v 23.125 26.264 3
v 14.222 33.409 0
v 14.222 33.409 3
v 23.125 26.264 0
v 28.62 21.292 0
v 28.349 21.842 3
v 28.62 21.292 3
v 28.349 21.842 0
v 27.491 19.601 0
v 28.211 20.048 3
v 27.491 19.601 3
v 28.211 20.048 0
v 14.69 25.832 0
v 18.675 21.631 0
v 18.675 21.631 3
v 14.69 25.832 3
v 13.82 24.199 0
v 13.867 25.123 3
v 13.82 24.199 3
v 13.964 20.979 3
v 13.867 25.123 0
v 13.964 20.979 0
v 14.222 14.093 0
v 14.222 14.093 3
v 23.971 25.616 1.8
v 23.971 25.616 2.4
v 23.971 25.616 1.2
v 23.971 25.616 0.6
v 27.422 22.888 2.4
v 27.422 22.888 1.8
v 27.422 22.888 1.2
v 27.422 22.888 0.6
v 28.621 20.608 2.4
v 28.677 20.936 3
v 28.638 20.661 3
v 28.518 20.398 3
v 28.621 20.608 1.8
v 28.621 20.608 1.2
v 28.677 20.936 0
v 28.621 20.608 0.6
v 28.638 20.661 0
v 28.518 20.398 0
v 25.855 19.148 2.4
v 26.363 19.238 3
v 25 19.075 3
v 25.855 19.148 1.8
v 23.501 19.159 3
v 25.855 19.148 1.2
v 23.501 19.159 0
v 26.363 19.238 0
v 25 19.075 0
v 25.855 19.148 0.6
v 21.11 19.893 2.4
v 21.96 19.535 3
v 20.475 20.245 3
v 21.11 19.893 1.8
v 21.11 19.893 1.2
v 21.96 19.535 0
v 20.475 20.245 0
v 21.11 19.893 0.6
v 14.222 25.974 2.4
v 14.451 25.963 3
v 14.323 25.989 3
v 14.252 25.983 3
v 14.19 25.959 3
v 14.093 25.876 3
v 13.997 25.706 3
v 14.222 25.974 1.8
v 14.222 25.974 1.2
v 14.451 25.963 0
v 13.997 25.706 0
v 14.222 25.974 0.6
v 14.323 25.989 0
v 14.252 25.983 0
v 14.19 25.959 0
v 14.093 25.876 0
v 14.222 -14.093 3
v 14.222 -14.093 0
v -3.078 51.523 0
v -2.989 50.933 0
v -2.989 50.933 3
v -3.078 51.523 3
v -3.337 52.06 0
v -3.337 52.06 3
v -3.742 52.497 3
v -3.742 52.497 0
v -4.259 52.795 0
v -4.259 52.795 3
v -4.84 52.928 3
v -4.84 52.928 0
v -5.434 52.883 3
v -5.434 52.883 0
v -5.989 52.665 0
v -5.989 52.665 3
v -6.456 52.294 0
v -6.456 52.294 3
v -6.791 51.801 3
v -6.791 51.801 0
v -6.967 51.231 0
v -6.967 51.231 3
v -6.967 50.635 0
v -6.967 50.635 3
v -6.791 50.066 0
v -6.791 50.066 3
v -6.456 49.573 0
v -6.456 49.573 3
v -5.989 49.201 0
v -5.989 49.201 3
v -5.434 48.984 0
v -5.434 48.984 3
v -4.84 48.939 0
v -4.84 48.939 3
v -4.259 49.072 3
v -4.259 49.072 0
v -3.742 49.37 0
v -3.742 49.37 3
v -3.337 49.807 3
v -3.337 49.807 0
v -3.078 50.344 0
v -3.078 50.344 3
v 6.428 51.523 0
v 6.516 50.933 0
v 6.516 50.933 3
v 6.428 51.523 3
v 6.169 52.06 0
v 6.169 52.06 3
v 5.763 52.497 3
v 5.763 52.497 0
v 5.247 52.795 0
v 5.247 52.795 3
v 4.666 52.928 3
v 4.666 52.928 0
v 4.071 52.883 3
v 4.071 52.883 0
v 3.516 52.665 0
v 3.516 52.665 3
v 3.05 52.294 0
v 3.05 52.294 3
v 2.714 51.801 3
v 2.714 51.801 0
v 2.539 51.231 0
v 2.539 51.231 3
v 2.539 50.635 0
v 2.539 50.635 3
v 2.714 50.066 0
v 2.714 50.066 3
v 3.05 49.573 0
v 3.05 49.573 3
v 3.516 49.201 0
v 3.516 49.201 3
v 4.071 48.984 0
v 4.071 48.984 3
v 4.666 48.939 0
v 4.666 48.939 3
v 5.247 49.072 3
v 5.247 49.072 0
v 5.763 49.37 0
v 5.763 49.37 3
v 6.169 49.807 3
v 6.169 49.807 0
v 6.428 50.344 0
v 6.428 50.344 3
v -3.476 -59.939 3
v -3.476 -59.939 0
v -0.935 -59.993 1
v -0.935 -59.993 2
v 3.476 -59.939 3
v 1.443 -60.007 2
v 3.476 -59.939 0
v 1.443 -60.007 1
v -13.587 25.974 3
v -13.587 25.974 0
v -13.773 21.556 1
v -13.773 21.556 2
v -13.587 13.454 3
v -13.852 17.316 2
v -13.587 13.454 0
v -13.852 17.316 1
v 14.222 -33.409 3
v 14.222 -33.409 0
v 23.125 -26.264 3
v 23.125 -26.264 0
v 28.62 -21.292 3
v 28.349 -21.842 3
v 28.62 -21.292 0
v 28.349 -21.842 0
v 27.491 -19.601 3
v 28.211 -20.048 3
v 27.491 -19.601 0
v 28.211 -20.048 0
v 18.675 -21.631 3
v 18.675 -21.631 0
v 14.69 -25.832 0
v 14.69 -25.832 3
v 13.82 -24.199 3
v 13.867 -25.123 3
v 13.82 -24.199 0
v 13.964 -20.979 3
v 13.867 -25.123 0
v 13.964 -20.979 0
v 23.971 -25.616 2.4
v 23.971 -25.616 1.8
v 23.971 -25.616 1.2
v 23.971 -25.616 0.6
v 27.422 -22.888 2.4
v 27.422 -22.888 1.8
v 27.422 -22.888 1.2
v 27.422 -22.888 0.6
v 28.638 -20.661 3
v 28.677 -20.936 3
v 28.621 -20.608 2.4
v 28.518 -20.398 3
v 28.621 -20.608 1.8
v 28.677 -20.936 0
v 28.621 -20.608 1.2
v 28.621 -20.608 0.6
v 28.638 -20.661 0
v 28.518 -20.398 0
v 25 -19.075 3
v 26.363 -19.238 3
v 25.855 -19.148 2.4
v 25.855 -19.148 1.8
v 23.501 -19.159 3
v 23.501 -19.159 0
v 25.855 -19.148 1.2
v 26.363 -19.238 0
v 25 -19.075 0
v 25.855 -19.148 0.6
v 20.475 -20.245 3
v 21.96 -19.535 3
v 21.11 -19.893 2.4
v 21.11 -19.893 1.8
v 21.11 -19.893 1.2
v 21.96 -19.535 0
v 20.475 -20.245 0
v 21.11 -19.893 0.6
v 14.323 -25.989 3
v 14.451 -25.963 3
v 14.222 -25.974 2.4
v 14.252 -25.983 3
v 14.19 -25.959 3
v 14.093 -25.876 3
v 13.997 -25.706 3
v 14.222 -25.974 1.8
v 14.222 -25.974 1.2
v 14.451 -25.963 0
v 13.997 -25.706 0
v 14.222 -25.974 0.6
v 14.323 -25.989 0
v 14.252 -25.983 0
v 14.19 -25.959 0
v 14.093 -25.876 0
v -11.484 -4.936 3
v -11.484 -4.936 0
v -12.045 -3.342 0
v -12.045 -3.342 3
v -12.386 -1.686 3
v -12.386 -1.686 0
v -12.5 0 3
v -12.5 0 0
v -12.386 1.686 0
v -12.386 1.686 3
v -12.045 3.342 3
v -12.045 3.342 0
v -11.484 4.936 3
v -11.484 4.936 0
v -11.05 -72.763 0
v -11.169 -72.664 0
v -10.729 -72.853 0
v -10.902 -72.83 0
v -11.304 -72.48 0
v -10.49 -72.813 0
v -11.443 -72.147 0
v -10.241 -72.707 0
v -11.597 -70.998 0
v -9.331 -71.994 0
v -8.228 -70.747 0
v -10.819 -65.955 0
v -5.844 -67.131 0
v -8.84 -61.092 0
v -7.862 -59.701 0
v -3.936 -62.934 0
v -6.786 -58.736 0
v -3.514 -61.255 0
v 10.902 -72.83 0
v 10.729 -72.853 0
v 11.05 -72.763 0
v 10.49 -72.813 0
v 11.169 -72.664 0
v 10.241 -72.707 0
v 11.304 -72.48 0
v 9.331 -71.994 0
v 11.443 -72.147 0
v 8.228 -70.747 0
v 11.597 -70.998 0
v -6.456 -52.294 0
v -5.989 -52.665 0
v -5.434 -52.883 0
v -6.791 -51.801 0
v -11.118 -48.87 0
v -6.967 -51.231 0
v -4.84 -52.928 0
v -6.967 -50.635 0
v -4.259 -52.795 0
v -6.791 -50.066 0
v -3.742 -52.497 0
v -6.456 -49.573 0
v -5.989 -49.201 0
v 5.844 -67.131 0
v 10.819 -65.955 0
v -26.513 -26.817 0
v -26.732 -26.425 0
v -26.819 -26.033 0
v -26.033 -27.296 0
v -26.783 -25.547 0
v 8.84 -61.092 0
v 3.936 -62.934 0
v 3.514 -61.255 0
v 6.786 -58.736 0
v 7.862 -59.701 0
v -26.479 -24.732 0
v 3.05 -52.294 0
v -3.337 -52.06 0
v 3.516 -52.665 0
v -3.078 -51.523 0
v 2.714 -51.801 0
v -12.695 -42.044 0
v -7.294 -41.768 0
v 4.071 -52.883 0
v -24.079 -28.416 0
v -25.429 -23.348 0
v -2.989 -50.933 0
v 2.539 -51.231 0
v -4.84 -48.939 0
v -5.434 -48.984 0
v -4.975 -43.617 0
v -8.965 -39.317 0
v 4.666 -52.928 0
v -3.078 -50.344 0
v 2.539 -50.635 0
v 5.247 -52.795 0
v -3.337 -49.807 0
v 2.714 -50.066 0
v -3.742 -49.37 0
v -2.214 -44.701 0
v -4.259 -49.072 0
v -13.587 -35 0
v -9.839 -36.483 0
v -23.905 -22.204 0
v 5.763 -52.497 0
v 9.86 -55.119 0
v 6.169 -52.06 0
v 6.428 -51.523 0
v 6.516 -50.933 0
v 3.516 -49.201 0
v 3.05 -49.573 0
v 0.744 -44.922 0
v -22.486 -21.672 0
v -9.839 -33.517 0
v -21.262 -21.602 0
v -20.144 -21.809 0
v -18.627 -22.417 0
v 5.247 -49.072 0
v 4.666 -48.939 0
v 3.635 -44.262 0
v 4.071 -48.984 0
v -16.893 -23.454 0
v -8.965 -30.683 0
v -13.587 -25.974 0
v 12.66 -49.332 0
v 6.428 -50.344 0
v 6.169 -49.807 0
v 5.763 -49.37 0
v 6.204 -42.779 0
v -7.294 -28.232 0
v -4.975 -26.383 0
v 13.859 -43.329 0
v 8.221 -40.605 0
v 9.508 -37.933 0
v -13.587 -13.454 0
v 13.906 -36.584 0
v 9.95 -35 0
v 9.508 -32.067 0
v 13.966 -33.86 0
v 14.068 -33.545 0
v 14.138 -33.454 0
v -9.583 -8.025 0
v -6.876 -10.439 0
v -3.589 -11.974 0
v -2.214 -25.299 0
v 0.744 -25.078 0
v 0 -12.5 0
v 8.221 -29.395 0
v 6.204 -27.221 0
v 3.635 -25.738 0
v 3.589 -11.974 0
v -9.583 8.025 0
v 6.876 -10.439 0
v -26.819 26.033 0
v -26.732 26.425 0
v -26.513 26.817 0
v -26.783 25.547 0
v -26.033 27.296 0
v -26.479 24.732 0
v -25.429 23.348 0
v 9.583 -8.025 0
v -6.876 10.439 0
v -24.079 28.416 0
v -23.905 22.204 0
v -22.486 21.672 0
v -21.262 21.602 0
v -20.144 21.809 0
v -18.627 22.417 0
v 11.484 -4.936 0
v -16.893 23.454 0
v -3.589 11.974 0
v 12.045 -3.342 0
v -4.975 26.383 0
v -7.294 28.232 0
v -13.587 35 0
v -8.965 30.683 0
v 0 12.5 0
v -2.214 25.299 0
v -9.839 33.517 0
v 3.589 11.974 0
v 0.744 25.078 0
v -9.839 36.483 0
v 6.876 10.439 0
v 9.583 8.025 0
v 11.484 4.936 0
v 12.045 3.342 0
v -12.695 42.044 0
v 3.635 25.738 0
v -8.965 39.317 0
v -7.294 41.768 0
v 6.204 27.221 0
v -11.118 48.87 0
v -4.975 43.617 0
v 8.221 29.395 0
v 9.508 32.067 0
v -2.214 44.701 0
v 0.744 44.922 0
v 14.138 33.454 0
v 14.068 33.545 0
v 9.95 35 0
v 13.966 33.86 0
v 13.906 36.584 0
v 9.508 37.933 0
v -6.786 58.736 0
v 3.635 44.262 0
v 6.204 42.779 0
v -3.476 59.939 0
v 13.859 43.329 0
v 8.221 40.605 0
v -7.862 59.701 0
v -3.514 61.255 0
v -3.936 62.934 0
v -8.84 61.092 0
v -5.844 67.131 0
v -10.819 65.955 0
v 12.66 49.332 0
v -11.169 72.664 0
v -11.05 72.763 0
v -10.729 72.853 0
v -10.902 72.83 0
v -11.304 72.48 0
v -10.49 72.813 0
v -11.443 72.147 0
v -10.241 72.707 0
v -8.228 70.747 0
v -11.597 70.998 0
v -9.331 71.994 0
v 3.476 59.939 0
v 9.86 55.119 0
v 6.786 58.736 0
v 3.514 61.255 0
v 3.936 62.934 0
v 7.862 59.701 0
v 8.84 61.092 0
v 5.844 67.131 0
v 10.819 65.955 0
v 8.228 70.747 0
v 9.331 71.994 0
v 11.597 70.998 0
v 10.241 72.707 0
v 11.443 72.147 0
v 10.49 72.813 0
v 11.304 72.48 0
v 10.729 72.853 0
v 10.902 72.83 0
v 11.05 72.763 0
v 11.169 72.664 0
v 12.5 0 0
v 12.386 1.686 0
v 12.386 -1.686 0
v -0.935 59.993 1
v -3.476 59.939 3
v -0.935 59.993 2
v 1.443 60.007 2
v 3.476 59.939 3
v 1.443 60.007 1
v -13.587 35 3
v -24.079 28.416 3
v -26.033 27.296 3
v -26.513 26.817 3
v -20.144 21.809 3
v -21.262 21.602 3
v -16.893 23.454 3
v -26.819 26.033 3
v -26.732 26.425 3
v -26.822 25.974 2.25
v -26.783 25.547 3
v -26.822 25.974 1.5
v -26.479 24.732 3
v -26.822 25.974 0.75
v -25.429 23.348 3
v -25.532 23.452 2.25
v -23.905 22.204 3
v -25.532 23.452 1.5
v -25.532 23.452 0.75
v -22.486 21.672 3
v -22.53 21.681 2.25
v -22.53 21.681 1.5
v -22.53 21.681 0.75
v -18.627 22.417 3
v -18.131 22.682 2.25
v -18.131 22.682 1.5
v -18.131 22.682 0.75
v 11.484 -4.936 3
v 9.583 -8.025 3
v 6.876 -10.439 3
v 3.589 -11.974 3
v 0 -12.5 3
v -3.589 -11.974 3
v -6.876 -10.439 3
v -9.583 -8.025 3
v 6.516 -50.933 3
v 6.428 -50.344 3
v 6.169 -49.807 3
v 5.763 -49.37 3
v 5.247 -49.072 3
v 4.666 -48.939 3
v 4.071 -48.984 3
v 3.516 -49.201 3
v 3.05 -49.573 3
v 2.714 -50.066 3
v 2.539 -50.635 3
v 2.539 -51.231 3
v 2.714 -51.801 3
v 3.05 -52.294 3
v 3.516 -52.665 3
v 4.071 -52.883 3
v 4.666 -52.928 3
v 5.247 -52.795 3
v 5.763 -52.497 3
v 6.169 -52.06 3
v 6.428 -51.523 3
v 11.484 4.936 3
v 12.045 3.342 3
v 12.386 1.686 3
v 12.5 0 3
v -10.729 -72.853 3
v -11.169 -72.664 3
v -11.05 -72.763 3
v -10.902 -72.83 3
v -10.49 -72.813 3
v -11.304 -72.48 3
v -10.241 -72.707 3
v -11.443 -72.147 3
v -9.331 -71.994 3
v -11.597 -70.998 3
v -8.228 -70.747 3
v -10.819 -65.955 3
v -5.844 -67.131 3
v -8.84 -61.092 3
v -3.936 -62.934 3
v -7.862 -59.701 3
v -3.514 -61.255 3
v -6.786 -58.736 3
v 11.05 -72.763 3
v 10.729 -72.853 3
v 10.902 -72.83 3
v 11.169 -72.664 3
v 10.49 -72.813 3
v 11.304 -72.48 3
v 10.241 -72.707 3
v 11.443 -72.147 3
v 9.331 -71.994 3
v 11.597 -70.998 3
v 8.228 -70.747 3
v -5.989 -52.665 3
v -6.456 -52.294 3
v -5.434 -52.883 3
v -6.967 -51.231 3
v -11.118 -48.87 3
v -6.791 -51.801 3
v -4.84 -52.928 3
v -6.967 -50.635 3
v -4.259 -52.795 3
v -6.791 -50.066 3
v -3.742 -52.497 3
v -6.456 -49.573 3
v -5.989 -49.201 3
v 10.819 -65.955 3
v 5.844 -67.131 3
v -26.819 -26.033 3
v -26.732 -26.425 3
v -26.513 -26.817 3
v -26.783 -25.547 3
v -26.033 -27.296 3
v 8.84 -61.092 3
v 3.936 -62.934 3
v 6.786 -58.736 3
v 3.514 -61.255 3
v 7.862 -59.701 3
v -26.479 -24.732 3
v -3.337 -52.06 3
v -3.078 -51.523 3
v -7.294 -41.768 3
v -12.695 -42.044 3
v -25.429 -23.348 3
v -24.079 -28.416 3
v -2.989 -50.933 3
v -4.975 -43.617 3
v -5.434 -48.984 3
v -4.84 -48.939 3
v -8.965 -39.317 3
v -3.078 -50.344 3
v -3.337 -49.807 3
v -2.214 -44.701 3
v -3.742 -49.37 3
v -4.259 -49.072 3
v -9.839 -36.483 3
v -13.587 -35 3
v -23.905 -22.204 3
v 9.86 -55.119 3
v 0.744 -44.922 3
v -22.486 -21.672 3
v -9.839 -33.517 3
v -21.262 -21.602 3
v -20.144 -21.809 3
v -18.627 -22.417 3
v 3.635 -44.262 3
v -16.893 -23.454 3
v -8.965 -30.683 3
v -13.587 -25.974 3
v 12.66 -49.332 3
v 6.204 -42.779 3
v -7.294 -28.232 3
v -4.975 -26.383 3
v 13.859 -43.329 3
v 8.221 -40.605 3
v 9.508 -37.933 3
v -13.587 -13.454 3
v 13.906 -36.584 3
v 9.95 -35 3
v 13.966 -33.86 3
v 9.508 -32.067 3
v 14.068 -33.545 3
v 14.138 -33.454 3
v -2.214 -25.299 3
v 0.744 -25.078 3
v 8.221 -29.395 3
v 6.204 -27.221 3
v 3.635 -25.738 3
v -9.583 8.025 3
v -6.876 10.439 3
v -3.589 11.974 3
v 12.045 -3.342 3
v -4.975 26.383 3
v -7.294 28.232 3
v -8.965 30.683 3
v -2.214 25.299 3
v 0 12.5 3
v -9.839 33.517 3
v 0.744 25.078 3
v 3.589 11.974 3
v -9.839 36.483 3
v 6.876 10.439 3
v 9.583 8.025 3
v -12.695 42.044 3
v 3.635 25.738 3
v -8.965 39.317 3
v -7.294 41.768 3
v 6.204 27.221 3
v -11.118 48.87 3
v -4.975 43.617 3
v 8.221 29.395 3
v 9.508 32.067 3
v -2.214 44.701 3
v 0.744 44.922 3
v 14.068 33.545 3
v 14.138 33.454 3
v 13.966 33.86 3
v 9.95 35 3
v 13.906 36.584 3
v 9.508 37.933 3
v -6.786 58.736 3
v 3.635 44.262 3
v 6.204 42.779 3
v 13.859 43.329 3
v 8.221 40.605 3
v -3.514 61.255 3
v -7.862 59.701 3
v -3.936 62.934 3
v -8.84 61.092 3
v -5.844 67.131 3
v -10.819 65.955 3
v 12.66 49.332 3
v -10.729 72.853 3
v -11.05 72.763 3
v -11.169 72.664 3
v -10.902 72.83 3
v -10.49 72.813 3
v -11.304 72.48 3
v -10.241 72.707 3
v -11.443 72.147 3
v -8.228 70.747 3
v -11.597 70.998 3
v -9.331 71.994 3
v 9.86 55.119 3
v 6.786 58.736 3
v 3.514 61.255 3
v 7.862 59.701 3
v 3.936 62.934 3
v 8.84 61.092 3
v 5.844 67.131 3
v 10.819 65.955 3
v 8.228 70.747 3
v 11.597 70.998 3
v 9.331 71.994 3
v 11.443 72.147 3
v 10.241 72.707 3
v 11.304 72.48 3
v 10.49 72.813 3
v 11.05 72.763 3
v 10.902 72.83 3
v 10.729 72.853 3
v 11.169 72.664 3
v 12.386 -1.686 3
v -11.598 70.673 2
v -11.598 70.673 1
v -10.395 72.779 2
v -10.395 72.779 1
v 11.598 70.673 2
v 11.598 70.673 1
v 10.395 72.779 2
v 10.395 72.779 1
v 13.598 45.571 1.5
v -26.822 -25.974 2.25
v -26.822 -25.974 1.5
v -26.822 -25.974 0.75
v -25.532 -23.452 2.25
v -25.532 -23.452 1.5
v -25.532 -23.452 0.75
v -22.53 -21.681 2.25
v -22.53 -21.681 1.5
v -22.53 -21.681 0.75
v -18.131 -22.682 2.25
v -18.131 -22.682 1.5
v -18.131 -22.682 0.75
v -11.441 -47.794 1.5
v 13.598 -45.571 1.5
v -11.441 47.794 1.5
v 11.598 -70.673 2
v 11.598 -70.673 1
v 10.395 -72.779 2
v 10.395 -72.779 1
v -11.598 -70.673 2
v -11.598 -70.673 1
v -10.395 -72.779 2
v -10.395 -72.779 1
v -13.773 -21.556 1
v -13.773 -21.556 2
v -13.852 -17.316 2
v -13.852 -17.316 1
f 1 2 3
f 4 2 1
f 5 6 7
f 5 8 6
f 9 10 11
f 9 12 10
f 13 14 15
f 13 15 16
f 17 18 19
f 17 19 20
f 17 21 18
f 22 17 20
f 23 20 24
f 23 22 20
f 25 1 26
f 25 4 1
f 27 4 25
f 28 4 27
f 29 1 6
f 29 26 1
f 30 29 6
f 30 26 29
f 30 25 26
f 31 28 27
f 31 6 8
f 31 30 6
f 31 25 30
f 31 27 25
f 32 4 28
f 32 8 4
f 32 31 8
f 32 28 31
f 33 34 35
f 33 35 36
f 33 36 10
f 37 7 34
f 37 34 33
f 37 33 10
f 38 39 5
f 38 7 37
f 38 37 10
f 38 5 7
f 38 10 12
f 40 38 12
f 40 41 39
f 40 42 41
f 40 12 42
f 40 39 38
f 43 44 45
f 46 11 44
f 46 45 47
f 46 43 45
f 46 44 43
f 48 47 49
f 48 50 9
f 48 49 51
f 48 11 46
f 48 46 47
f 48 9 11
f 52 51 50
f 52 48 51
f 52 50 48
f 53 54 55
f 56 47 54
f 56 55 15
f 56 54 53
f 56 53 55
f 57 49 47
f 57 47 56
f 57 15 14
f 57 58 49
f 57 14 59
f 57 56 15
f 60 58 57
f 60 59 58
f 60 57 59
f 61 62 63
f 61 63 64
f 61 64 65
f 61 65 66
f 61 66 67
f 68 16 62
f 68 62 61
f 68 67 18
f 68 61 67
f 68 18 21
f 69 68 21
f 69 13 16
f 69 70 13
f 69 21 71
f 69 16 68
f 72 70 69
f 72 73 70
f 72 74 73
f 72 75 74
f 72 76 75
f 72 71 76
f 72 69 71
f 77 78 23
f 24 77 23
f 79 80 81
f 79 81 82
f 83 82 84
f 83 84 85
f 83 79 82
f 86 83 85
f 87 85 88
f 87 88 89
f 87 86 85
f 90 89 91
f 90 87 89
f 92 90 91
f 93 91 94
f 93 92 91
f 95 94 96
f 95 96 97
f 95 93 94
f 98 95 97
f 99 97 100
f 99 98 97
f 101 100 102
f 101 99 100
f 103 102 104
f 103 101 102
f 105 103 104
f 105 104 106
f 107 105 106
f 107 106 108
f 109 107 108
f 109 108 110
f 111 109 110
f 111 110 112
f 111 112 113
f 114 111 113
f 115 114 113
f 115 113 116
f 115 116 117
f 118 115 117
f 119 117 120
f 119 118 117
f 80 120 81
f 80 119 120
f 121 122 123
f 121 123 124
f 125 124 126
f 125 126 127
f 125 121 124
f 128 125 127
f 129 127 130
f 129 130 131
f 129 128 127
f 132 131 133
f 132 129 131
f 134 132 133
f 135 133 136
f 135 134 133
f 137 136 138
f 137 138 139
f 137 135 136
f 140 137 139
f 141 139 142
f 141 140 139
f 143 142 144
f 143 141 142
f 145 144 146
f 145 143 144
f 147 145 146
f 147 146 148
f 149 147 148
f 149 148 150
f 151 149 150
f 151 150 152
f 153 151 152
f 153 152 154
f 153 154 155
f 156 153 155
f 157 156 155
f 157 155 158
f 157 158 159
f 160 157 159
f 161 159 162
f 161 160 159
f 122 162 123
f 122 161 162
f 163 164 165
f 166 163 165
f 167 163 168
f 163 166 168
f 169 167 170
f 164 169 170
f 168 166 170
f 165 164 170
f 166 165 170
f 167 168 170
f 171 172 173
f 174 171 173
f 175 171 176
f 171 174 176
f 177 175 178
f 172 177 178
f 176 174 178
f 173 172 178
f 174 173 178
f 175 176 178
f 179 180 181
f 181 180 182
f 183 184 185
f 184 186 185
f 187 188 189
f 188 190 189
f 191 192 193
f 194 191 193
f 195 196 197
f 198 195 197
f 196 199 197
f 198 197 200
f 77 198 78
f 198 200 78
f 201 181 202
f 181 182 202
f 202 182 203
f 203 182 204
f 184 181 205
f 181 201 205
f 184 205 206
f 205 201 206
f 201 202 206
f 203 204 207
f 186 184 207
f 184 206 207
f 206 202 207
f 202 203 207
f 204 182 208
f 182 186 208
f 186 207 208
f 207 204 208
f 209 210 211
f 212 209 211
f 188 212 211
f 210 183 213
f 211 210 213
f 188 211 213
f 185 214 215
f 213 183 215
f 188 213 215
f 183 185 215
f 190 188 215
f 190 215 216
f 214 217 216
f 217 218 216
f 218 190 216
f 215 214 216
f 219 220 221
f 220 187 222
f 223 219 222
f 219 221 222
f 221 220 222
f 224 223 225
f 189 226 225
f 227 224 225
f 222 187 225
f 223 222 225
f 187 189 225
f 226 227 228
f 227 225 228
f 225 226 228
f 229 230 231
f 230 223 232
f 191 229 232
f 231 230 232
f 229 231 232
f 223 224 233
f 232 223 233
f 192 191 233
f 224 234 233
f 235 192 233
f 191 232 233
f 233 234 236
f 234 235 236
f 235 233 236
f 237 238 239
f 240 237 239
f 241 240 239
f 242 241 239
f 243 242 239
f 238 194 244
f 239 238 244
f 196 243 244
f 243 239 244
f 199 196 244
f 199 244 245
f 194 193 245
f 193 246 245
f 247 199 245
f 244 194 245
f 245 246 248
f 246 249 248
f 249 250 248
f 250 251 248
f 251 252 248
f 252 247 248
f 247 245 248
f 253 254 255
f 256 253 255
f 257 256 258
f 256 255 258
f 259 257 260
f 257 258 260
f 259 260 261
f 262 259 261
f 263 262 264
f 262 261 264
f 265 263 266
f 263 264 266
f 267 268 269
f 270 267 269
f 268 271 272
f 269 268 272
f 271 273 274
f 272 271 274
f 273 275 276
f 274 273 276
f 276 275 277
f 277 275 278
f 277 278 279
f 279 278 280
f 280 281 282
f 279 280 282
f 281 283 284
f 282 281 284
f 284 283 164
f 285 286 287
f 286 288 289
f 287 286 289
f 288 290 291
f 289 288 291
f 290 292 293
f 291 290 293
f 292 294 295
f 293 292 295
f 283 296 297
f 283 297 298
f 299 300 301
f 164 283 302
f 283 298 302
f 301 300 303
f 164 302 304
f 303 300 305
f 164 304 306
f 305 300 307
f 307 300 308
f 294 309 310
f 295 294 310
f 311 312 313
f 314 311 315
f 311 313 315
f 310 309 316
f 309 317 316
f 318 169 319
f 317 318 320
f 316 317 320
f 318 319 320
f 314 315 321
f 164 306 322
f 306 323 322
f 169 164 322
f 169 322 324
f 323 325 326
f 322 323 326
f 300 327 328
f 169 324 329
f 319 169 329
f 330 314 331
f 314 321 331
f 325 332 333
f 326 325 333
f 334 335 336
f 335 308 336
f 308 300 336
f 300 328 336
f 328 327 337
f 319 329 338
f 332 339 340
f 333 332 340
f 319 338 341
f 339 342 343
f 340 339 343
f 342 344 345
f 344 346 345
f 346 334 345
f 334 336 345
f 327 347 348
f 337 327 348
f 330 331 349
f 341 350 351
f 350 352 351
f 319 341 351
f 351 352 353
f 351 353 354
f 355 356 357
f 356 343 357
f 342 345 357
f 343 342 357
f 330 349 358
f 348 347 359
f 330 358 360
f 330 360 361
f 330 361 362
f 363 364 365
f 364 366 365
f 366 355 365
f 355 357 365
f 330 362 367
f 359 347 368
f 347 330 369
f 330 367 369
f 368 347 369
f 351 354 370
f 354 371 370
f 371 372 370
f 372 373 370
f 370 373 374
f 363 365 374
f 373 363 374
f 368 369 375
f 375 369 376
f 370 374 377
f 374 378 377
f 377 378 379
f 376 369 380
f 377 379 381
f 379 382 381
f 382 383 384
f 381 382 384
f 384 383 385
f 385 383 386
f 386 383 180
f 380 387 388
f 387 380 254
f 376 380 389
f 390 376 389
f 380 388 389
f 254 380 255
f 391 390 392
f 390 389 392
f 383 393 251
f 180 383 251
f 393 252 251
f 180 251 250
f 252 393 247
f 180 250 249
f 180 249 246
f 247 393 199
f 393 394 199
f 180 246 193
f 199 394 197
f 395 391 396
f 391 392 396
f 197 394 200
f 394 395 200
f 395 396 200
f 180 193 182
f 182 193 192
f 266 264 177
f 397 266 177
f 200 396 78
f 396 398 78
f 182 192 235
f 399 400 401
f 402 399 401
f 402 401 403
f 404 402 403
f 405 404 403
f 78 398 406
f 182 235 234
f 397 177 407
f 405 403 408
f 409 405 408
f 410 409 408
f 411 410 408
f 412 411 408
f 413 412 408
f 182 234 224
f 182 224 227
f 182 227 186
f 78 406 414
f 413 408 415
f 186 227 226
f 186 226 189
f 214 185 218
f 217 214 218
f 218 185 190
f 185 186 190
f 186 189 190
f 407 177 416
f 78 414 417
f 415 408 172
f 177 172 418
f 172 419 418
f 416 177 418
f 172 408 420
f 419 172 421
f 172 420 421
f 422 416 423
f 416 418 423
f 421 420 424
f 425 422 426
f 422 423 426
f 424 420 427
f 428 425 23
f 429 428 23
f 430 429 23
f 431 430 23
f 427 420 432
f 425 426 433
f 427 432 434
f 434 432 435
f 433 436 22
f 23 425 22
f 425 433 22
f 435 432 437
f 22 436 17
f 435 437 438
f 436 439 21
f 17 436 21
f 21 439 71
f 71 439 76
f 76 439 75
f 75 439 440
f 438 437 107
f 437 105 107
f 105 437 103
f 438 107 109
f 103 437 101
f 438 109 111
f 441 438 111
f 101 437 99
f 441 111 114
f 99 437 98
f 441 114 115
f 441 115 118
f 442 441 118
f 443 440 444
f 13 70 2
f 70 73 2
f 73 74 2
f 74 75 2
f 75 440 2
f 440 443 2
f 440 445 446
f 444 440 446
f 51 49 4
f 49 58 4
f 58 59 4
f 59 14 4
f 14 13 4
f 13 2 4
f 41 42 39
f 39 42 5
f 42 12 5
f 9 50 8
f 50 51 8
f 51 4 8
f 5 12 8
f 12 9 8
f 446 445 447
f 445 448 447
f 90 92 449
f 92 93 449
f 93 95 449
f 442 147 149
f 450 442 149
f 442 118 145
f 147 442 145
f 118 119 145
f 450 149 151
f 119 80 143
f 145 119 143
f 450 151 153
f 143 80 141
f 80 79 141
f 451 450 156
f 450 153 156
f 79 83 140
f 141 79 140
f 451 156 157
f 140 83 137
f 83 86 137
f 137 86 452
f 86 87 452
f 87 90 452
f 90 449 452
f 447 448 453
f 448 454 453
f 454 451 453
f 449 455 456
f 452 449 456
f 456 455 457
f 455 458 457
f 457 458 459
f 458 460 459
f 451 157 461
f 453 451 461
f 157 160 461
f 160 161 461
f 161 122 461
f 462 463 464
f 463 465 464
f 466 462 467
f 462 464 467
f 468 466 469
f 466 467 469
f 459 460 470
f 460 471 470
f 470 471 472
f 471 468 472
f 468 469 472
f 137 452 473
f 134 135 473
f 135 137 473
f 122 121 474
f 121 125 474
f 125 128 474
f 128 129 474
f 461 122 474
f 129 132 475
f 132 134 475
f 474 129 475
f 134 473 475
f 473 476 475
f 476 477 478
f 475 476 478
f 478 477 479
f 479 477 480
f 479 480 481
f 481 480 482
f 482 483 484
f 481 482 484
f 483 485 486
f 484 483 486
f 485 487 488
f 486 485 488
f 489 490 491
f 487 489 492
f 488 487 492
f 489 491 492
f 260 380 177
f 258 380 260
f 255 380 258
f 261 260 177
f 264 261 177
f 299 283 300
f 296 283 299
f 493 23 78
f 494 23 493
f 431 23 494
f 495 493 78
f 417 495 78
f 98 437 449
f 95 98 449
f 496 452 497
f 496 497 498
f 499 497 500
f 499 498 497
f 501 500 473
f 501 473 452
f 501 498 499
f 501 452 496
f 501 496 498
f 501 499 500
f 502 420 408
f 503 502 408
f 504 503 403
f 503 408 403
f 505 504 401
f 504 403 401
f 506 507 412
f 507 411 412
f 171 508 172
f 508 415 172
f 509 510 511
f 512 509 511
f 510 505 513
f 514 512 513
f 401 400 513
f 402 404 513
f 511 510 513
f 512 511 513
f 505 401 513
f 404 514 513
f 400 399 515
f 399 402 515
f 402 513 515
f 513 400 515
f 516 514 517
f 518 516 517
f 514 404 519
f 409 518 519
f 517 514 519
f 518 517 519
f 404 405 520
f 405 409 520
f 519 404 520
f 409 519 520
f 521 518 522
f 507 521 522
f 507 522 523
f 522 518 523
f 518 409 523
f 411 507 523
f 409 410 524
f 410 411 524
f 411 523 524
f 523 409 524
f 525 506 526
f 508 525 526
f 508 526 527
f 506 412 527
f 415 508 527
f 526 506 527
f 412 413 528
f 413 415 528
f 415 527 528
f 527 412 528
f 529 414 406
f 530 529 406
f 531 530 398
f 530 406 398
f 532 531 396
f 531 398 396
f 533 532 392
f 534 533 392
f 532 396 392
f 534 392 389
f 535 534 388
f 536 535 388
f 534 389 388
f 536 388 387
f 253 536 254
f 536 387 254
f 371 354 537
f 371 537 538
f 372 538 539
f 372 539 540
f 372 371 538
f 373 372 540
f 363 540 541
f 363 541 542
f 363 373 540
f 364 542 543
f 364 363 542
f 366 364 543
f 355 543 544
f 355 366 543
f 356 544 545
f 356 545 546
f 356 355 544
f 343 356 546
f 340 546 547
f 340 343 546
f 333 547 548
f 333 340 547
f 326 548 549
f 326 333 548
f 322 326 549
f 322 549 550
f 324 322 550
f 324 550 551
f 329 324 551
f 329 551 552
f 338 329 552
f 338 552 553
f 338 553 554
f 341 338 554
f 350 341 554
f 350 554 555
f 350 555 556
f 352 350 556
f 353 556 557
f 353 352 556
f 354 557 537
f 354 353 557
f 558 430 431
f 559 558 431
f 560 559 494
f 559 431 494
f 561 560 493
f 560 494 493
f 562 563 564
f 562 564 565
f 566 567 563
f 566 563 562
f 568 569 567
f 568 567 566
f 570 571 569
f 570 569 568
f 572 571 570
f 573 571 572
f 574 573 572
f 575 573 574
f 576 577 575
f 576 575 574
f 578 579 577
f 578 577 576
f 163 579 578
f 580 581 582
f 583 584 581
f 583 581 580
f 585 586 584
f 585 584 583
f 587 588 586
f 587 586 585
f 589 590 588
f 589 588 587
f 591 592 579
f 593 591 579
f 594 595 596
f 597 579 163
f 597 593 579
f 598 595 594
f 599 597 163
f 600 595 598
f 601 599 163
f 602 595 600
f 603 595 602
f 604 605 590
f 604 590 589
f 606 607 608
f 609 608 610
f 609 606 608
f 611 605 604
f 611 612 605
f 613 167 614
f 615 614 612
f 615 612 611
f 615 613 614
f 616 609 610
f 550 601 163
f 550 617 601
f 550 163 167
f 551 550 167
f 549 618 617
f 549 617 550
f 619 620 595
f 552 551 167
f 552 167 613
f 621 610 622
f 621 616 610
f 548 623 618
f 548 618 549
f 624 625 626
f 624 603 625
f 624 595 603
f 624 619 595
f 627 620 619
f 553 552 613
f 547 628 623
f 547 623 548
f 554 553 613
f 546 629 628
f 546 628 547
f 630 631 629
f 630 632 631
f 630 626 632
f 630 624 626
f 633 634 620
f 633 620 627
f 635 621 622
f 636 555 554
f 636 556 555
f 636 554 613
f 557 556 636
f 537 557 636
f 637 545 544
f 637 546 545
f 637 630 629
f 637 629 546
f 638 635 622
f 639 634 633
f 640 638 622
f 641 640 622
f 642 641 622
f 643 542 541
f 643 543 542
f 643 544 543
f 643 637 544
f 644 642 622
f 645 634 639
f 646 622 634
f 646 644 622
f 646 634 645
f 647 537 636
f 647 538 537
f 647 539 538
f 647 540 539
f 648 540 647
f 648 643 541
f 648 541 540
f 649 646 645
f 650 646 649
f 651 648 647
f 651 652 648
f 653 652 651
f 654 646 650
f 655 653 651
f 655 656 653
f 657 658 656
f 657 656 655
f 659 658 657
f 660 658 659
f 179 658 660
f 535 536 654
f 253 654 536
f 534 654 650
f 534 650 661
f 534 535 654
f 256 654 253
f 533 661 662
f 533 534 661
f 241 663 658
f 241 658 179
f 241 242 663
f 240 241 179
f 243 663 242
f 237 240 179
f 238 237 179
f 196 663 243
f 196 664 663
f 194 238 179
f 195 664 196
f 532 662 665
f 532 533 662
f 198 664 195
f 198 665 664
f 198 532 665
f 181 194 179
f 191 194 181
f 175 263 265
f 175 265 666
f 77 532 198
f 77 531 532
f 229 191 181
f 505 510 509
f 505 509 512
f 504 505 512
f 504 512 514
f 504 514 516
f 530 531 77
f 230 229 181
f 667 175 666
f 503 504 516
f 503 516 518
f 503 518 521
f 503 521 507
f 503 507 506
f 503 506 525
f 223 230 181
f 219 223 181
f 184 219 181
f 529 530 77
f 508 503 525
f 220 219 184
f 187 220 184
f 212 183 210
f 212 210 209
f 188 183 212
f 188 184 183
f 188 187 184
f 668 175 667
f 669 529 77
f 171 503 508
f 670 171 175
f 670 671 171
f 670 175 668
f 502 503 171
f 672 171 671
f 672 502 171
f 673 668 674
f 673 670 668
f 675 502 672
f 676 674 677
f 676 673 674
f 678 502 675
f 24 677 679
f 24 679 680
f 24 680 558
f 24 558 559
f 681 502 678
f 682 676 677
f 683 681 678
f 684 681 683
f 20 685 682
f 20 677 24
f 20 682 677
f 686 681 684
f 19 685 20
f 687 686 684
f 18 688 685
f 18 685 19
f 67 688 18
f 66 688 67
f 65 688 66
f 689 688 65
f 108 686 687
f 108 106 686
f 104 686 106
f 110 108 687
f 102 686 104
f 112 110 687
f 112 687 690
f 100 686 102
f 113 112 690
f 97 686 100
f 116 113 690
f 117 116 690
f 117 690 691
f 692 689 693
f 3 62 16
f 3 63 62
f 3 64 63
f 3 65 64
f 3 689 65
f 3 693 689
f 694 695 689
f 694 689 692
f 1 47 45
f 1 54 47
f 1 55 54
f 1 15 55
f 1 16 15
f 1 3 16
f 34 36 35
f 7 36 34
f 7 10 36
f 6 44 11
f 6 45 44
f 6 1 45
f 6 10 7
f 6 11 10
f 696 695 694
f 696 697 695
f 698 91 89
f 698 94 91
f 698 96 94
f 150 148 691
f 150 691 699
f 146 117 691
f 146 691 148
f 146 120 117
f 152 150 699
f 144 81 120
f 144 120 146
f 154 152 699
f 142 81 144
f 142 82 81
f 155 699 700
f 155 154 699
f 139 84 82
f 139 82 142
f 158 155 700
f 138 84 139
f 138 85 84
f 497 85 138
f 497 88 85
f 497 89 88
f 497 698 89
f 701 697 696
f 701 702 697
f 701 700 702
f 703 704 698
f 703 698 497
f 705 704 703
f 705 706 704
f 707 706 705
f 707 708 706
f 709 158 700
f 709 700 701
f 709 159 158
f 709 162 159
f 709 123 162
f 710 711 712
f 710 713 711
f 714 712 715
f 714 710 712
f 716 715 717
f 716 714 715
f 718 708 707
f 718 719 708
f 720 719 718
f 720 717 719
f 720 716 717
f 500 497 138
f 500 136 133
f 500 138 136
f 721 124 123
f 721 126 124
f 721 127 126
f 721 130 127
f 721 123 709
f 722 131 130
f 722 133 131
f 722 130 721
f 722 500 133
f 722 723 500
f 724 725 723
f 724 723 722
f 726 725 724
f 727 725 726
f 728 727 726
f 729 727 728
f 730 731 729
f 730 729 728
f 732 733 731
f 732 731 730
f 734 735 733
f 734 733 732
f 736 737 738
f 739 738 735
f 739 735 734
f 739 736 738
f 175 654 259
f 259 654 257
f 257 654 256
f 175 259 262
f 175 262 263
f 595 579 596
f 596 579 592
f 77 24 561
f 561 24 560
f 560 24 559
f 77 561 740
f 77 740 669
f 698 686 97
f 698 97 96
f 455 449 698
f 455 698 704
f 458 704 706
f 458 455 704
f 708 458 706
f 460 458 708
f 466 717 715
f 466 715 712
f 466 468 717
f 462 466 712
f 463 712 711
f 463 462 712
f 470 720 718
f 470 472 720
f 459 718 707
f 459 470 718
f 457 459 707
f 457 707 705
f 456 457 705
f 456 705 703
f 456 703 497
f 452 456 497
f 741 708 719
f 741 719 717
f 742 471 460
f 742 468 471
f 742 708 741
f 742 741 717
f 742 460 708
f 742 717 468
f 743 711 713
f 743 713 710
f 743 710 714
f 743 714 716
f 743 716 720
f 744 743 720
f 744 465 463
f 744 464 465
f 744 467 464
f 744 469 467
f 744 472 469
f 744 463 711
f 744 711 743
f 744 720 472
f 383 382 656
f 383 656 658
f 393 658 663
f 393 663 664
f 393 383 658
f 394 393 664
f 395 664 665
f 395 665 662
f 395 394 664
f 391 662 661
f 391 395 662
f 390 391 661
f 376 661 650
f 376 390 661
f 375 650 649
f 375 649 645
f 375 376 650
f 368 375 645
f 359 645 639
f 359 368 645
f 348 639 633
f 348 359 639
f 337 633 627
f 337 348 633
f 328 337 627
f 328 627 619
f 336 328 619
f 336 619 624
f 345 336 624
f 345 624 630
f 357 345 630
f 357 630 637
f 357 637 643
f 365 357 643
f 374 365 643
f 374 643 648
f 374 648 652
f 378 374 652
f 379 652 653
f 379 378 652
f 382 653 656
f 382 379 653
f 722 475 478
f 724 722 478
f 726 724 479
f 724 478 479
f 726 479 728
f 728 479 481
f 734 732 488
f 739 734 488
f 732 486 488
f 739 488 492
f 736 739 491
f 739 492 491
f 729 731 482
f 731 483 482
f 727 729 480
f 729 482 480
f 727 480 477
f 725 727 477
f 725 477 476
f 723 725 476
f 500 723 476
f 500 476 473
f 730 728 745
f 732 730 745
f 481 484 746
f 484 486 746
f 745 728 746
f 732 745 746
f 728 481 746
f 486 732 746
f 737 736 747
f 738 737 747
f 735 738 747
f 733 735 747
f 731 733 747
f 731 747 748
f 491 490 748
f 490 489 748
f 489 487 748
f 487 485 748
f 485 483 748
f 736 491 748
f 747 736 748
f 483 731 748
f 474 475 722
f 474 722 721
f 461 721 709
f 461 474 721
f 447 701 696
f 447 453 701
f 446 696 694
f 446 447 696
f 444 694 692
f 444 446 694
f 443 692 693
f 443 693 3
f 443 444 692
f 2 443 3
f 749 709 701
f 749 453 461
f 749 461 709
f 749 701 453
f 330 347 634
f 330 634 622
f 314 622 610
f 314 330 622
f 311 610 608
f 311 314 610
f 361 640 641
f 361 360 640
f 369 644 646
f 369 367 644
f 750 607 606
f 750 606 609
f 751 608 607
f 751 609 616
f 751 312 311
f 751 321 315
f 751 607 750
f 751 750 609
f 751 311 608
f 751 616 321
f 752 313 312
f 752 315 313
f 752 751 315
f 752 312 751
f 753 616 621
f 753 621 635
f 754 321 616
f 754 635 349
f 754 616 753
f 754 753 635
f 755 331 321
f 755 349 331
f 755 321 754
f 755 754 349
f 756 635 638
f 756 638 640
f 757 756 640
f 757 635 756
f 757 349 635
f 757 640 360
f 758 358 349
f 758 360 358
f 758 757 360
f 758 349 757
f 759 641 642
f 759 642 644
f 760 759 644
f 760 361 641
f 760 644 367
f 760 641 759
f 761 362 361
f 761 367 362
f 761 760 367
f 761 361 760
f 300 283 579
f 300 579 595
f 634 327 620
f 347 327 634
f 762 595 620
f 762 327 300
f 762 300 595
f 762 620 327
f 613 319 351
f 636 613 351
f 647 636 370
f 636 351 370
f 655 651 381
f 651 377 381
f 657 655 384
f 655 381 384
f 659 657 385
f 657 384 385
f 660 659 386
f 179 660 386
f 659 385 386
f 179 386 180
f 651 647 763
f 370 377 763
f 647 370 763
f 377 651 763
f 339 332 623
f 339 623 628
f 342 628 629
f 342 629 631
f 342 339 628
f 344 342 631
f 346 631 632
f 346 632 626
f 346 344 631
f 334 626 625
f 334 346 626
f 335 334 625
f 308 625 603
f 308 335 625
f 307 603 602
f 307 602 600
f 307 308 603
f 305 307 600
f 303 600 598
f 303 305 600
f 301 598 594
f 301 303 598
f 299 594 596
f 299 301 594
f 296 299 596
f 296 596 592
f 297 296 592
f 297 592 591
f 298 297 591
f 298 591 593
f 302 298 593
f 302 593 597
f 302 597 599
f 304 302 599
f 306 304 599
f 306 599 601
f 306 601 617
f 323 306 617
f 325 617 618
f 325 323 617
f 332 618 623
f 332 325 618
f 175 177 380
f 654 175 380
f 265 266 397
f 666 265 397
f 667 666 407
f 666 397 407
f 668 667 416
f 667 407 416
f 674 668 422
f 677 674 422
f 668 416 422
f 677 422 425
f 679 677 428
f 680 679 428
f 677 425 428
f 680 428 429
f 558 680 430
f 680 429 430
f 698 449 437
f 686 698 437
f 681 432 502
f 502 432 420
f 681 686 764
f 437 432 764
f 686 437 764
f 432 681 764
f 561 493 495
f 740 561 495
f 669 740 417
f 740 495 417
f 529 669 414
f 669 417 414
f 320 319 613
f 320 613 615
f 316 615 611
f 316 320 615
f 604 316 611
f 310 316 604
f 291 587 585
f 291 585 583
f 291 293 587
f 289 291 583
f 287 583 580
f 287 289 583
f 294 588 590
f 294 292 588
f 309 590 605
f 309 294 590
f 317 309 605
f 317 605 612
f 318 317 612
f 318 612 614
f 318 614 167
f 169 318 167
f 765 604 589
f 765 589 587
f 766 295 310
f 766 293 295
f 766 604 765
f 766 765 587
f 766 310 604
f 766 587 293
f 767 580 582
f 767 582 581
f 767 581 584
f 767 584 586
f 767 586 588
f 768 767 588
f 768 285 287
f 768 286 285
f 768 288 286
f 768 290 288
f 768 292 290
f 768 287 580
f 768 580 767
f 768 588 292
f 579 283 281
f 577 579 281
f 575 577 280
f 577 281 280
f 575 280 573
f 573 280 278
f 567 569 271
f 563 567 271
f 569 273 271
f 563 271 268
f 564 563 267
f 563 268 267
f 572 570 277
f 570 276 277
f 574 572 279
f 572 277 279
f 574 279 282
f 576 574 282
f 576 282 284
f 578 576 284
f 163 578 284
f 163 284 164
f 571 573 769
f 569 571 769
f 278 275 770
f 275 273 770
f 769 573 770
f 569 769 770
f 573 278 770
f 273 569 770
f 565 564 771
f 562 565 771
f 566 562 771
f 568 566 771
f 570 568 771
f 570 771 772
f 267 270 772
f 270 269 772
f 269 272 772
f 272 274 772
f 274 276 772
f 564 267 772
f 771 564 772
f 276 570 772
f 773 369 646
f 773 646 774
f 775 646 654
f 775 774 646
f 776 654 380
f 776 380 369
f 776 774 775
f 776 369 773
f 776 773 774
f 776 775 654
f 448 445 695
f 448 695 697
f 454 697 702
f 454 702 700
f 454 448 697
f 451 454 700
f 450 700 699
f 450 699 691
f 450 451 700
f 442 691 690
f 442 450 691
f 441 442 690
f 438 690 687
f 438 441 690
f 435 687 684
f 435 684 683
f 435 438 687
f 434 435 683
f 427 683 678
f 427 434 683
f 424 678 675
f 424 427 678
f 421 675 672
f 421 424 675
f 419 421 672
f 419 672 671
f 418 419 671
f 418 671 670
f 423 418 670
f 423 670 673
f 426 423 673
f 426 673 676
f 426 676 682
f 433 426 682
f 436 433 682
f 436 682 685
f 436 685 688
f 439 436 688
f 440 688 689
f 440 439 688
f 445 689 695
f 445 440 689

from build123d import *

# Parameters (mm, degrees)
F0_R     = 9.95
F0_R_2   = 2
F1_DEPTH = 3


with BuildPart() as f1:
    # F0 (on Top) → F1 (new body)
    with BuildSketch(Plane.XY):
        with BuildLine():
            ThreePointArc((11.4841992525, 4.9359059482), (12.2434164075, 2.5196735249), (12.5, 0))
            ThreePointArc((12.5, 0), (12.2434164075, -2.5196735249), (11.4841992525, -4.9359059482))
            add(Edge.make_bspline(
                [(14.2224282026, -14.0928809608), (14.0544920655, -9.8907769593), (12.786453361, -7.4166448155), (11.4841992525, -4.9359059482)],
                knots=[0.8325588202, 0.8325588202, 0.8325588202, 0.8325588202, 1, 1, 1, 1], degree=3))
            Line((14.2224282026, -14.0928809608), (14.2224282026, 14.0928809608))
            add(Edge.make_bspline(
                [(14.2224282026, 14.0928809608), (14.0544920655, 9.8907769593), (12.786453361, 7.4166448155), (11.4841992525, 4.9359059482)],
                knots=[0.8325588202, 0.8325588202, 0.8325588202, 0.8325588202, 1, 1, 1, 1], degree=3))
        make_face()
        with BuildLine():
            ThreePointArc((-11.4841992525, 4.9359059482), (0, 12.5), (11.4841992525, 4.9359059482))
            add(Edge.make_bspline(
                [(14.2224282026, 14.0928809608), (14.0544920655, 9.8907769593), (12.786453361, 7.4166448155), (11.4841992525, 4.9359059482)],
                knots=[0.8325588202, 0.8325588202, 0.8325588202, 0.8325588202, 1, 1, 1, 1], degree=3))
            add(Edge.make_bspline(
                [(14.2224282026, 33.4090046103), (17.2490888751, 31.053920445), (22.9972849489, 26.096831604), (31.8177344645, 20.0637888806), (19.9640756328, 17.3628075785), (12.1914727142, 31.6199203566), (14.4096662851, 18.7779589277), (14.2224282026, 14.0928809608)],
                knots=[0, 0, 0, 0, 0.1913410371, 0.3329271624, 0.4817047499, 0.6458725835, 0.8325588202, 0.8325588202, 0.8325588202, 0.8325588202], degree=3))
            add(Edge.make_bspline(
                [(6.7855482785, 58.7356220744), (9.1373873892, 56.8141843385), (15.7434191997, 47.0784545997), (13.3729768574, 33.6002030956), (14.2224282026, 33.4090046103)],
                knots=[0.3534018687, 0.3534018687, 0.3534018687, 0.3534018687, 0.6548758459, 0.9281252581, 0.9281252581, 0.9281252581, 0.9281252581], degree=3))
            add(Edge.make_bspline(
                [(3.4762175574, 59.9388580104), (3.7176838971, 58.2597836406), (5.3504042624, 57.8229914395), (6.7855482785, 58.7356220744)],
                knots=[0.8268984236, 0.8268984236, 0.8268984236, 0.8268984236, 1, 1, 1, 1], degree=3))
            add(Edge.make_bspline(
                [(-3.4762175574, 59.9388580104), (-0.9132762133, 60), (1.6758513881, 60.0610536656), (3.4762175574, 59.9388580104)],
                knots=[0, 0, 0, 0, 0.2064654422, 0.2064654422, 0.2064654422, 0.2064654422], degree=3))
            add(Edge.make_bspline(
                [(-3.4762175574, 59.9388580104), (-3.7176838971, 58.2597836406), (-5.3504042624, 57.8229914395), (-6.7855482785, 58.7356220744)],
                knots=[0.8268984236, 0.8268984236, 0.8268984236, 0.8268984236, 1, 1, 1, 1], degree=3))
            add(Edge.make_bspline(
                [(-6.7855482785, 58.7356220744), (-8.5881051608, 55.5003900744), (-12.1208026299, 47.809859872), (-13.1336634583, 39.352034704), (-13.5873220861, 35)],
                knots=[0, 0, 0, 0, 0.4891254011, 1, 1, 1, 1], degree=3))
            add(Edge.make_bspline(
                [(-13.5873220861, 35), (-16.9512808708, 32.6719958826), (-22.4422707428, 28.8719947978), (-28.7100144619, 26.5342926433), (-22.0598012934, 19.1597220145), (-16.6324705303, 23.5247038367), (-13.5873220861, 25.9737931192)],
                knots=[0, 0, 0, 0, 0.3038929296, 0.4960444243, 0.7172423049, 1, 1, 1, 1], degree=3))
            add(Edge.make_bspline(
                [(-13.5873220861, 25.9737931192), (-13.7484282726, 21.5353356165), (-14.1021202558, 17.0585195355), (-13.5873220861, 13.4542575106)],
                knots=[0, 0, 0, 0, 0.544318651, 0.544318651, 0.544318651, 0.544318651], degree=3))
            add(Edge.make_bspline(
                [(-13.5873220861, 13.4542575106), (-13.1563540785, 10.436916512), (-12.116717364, 8.0310923479), (-11.4841992525, 4.9359059482)],
                knots=[0.544318651, 0.544318651, 0.544318651, 0.544318651, 1, 1, 1, 1], degree=3))
        make_face()
        with Locations((0, 35)):
            Circle(F0_R, mode=Mode.SUBTRACT)
        with Locations((-4.9894000404, 50.9333796799)):
            Circle(F0_R_2, mode=Mode.SUBTRACT)
        with Locations((4.5164329931, 50.9333796799)):
            Circle(F0_R_2, mode=Mode.SUBTRACT)
        with BuildLine():
            add(Edge.make_bspline(
                [(14.2224282026, -14.0928809608), (14.0544920655, -9.8907769593), (12.786453361, -7.4166448155), (11.4841992525, -4.9359059482)],
                knots=[0.8325588202, 0.8325588202, 0.8325588202, 0.8325588202, 1, 1, 1, 1], degree=3))
            ThreePointArc((11.4841992525, -4.9359059482), (0, -12.5), (-11.4841992525, -4.9359059482))
            add(Edge.make_bspline(
                [(-13.5873220861, -13.4542575106), (-13.1563540785, -10.436916512), (-12.116717364, -8.0310923479), (-11.4841992525, -4.9359059482)],
                knots=[0.544318651, 0.544318651, 0.544318651, 0.544318651, 1, 1, 1, 1], degree=3))
            add(Edge.make_bspline(
                [(-13.5873220861, -25.9737931192), (-13.7484282726, -21.5353356165), (-14.1021202558, -17.0585195355), (-13.5873220861, -13.4542575106)],
                knots=[0, 0, 0, 0, 0.544318651, 0.544318651, 0.544318651, 0.544318651], degree=3))
            add(Edge.make_bspline(
                [(-13.5873220861, -35), (-16.9512808708, -32.6719958826), (-22.4422707428, -28.8719947978), (-28.7100144619, -26.5342926433), (-22.0598012934, -19.1597220145), (-16.6324705303, -23.5247038367), (-13.5873220861, -25.9737931192)],
                knots=[0, 0, 0, 0, 0.3038929296, 0.4960444243, 0.7172423049, 1, 1, 1, 1], degree=3))
            add(Edge.make_bspline(
                [(-6.7855482785, -58.7356220744), (-8.5881051608, -55.5003900744), (-12.1208026299, -47.809859872), (-13.1336634583, -39.352034704), (-13.5873220861, -35)],
                knots=[0, 0, 0, 0, 0.4891254011, 1, 1, 1, 1], degree=3))
            add(Edge.make_bspline(
                [(-3.4762175574, -59.9388580104), (-3.7176838971, -58.2597836406), (-5.3504042624, -57.8229914395), (-6.7855482785, -58.7356220744)],
                knots=[0.8268984236, 0.8268984236, 0.8268984236, 0.8268984236, 1, 1, 1, 1], degree=3))
            add(Edge.make_bspline(
                [(-3.4762175574, -59.9388580104), (-0.9132762133, -60), (1.6758513881, -60.0610536656), (3.4762175574, -59.9388580104)],
                knots=[0, 0, 0, 0, 0.2064654422, 0.2064654422, 0.2064654422, 0.2064654422], degree=3))
            add(Edge.make_bspline(
                [(3.4762175574, -59.9388580104), (3.7176838971, -58.2597836406), (5.3504042624, -57.8229914395), (6.7855482785, -58.7356220744)],
                knots=[0.8268984236, 0.8268984236, 0.8268984236, 0.8268984236, 1, 1, 1, 1], degree=3))
            add(Edge.make_bspline(
                [(6.7855482785, -58.7356220744), (9.1373873892, -56.8141843385), (15.7434191997, -47.0784545997), (13.3729768574, -33.6002030956), (14.2224282026, -33.4090046103)],
                knots=[0.3534018687, 0.3534018687, 0.3534018687, 0.3534018687, 0.6548758459, 0.9281252581, 0.9281252581, 0.9281252581, 0.9281252581], degree=3))
            add(Edge.make_bspline(
                [(14.2224282026, -33.4090046103), (17.2490888751, -31.053920445), (22.9972849489, -26.096831604), (31.8177344645, -20.0637888806), (19.9640756328, -17.3628075785), (12.1914727142, -31.6199203566), (14.4096662851, -18.7779589277), (14.2224282026, -14.0928809608)],
                knots=[0, 0, 0, 0, 0.1913410371, 0.3329271624, 0.4817047499, 0.6458725835, 0.8325588202, 0.8325588202, 0.8325588202, 0.8325588202], degree=3))
        make_face()
        with Locations((-4.9894000404, -50.9333796799)):
            Circle(F0_R_2, mode=Mode.SUBTRACT)
        with Locations((0, -35)):
            Circle(F0_R, mode=Mode.SUBTRACT)
        with Locations((4.5164329931, -50.9333796799)):
            Circle(F0_R_2, mode=Mode.SUBTRACT)
        with BuildLine():
            ThreePointArc((-12.5, 0), (-12.2434164075, 2.5196735249), (-11.4841992525, 4.9359059482))
            add(Edge.make_bspline(
                [(-13.5873220861, 13.4542575106), (-13.1563540785, 10.436916512), (-12.116717364, 8.0310923479), (-11.4841992525, 4.9359059482)],
                knots=[0.544318651, 0.544318651, 0.544318651, 0.544318651, 1, 1, 1, 1], degree=3))
            Line((-13.5873220861, 13.4542575106), (-13.5873220861, -13.4542575106))
            add(Edge.make_bspline(
                [(-13.5873220861, -13.4542575106), (-13.1563540785, -10.436916512), (-12.116717364, -8.0310923479), (-11.4841992525, -4.9359059482)],
                knots=[0.544318651, 0.544318651, 0.544318651, 0.544318651, 1, 1, 1, 1], degree=3))
            ThreePointArc((-11.4841992525, -4.9359059482), (-12.2434164075, -2.5196735249), (-12.5, 0))
        make_face()
        with BuildLine():
            add(Edge.make_bspline(
                [(3.4762175574, 59.9388580104), (4.75749431, 59.8518943387), (5.6392774199, 59.6721181439), (6.7855482785, 58.7356220744)],
                knots=[0.2064654422, 0.2064654422, 0.2064654422, 0.2064654422, 0.3534018687, 0.3534018687, 0.3534018687, 0.3534018687], degree=3))
            add(Edge.make_bspline(
                [(6.7855482785, 58.7356220744), (9.5293676869, 60.4804599584), (12.4284956458, 70.0561754003), (10.4054106349, 75.4105917089), (2.9847830091, 63.356125839), (3.4762175574, 59.9388580104)],
                knots=[0, 0, 0, 0, 0.3309489915, 0.4746004798, 0.8268984236, 0.8268984236, 0.8268984236, 0.8268984236], degree=3))
        make_face()
        with BuildLine():
            add(Edge.make_bspline(
                [(3.4762175574, 59.9388580104), (3.7176838971, 58.2597836406), (5.3504042624, 57.8229914395), (6.7855482785, 58.7356220744)],
                knots=[0.8268984236, 0.8268984236, 0.8268984236, 0.8268984236, 1, 1, 1, 1], degree=3))
            add(Edge.make_bspline(
                [(3.4762175574, 59.9388580104), (4.75749431, 59.8518943387), (5.6392774199, 59.6721181439), (6.7855482785, 58.7356220744)],
                knots=[0.2064654422, 0.2064654422, 0.2064654422, 0.2064654422, 0.3534018687, 0.3534018687, 0.3534018687, 0.3534018687], degree=3))
        make_face()
        with BuildLine():
            add(Edge.make_bspline(
                [(6.7855482785, -58.7356220744), (9.5293676869, -60.4804599584), (12.4284956458, -70.0561754003), (10.4054106349, -75.4105917089), (2.9847830091, -63.356125839), (3.4762175574, -59.9388580104)],
                knots=[0, 0, 0, 0, 0.3309489915, 0.4746004798, 0.8268984236, 0.8268984236, 0.8268984236, 0.8268984236], degree=3))
            add(Edge.make_bspline(
                [(3.4762175574, -59.9388580104), (4.75749431, -59.8518943387), (5.6392774199, -59.6721181439), (6.7855482785, -58.7356220744)],
                knots=[0.2064654422, 0.2064654422, 0.2064654422, 0.2064654422, 0.3534018687, 0.3534018687, 0.3534018687, 0.3534018687], degree=3))
        make_face()
        with BuildLine():
            add(Edge.make_bspline(
                [(3.4762175574, -59.9388580104), (4.75749431, -59.8518943387), (5.6392774199, -59.6721181439), (6.7855482785, -58.7356220744)],
                knots=[0.2064654422, 0.2064654422, 0.2064654422, 0.2064654422, 0.3534018687, 0.3534018687, 0.3534018687, 0.3534018687], degree=3))
            add(Edge.make_bspline(
                [(3.4762175574, -59.9388580104), (3.7176838971, -58.2597836406), (5.3504042624, -57.8229914395), (6.7855482785, -58.7356220744)],
                knots=[0.8268984236, 0.8268984236, 0.8268984236, 0.8268984236, 1, 1, 1, 1], degree=3))
        make_face()
        with BuildLine():
            add(Edge.make_bspline(
                [(-6.7855482785, 58.7356220744), (-9.5293676869, 60.4804599584), (-12.4284956458, 70.0561754003), (-10.4054106349, 75.4105917089), (-2.9847830091, 63.356125839), (-3.4762175574, 59.9388580104)],
                knots=[0, 0, 0, 0, 0.3309489915, 0.4746004798, 0.8268984236, 0.8268984236, 0.8268984236, 0.8268984236], degree=3))
            add(Edge.make_bspline(
                [(-3.4762175574, 59.9388580104), (-3.7176838971, 58.2597836406), (-5.3504042624, 57.8229914395), (-6.7855482785, 58.7356220744)],
                knots=[0.8268984236, 0.8268984236, 0.8268984236, 0.8268984236, 1, 1, 1, 1], degree=3))
        make_face()
        with BuildLine():
            add(Edge.make_bspline(
                [(-6.7855482785, -58.7356220744), (-9.5293676869, -60.4804599584), (-12.4284956458, -70.0561754003), (-10.4054106349, -75.4105917089), (-2.9847830091, -63.356125839), (-3.4762175574, -59.9388580104)],
                knots=[0, 0, 0, 0, 0.3309489915, 0.4746004798, 0.8268984236, 0.8268984236, 0.8268984236, 0.8268984236], degree=3))
            add(Edge.make_bspline(
                [(-3.4762175574, -59.9388580104), (-3.7176838971, -58.2597836406), (-5.3504042624, -57.8229914395), (-6.7855482785, -58.7356220744)],
                knots=[0.8268984236, 0.8268984236, 0.8268984236, 0.8268984236, 1, 1, 1, 1], degree=3))
        make_face()
    extrude(amount=F1_DEPTH)


solid = f1.part
